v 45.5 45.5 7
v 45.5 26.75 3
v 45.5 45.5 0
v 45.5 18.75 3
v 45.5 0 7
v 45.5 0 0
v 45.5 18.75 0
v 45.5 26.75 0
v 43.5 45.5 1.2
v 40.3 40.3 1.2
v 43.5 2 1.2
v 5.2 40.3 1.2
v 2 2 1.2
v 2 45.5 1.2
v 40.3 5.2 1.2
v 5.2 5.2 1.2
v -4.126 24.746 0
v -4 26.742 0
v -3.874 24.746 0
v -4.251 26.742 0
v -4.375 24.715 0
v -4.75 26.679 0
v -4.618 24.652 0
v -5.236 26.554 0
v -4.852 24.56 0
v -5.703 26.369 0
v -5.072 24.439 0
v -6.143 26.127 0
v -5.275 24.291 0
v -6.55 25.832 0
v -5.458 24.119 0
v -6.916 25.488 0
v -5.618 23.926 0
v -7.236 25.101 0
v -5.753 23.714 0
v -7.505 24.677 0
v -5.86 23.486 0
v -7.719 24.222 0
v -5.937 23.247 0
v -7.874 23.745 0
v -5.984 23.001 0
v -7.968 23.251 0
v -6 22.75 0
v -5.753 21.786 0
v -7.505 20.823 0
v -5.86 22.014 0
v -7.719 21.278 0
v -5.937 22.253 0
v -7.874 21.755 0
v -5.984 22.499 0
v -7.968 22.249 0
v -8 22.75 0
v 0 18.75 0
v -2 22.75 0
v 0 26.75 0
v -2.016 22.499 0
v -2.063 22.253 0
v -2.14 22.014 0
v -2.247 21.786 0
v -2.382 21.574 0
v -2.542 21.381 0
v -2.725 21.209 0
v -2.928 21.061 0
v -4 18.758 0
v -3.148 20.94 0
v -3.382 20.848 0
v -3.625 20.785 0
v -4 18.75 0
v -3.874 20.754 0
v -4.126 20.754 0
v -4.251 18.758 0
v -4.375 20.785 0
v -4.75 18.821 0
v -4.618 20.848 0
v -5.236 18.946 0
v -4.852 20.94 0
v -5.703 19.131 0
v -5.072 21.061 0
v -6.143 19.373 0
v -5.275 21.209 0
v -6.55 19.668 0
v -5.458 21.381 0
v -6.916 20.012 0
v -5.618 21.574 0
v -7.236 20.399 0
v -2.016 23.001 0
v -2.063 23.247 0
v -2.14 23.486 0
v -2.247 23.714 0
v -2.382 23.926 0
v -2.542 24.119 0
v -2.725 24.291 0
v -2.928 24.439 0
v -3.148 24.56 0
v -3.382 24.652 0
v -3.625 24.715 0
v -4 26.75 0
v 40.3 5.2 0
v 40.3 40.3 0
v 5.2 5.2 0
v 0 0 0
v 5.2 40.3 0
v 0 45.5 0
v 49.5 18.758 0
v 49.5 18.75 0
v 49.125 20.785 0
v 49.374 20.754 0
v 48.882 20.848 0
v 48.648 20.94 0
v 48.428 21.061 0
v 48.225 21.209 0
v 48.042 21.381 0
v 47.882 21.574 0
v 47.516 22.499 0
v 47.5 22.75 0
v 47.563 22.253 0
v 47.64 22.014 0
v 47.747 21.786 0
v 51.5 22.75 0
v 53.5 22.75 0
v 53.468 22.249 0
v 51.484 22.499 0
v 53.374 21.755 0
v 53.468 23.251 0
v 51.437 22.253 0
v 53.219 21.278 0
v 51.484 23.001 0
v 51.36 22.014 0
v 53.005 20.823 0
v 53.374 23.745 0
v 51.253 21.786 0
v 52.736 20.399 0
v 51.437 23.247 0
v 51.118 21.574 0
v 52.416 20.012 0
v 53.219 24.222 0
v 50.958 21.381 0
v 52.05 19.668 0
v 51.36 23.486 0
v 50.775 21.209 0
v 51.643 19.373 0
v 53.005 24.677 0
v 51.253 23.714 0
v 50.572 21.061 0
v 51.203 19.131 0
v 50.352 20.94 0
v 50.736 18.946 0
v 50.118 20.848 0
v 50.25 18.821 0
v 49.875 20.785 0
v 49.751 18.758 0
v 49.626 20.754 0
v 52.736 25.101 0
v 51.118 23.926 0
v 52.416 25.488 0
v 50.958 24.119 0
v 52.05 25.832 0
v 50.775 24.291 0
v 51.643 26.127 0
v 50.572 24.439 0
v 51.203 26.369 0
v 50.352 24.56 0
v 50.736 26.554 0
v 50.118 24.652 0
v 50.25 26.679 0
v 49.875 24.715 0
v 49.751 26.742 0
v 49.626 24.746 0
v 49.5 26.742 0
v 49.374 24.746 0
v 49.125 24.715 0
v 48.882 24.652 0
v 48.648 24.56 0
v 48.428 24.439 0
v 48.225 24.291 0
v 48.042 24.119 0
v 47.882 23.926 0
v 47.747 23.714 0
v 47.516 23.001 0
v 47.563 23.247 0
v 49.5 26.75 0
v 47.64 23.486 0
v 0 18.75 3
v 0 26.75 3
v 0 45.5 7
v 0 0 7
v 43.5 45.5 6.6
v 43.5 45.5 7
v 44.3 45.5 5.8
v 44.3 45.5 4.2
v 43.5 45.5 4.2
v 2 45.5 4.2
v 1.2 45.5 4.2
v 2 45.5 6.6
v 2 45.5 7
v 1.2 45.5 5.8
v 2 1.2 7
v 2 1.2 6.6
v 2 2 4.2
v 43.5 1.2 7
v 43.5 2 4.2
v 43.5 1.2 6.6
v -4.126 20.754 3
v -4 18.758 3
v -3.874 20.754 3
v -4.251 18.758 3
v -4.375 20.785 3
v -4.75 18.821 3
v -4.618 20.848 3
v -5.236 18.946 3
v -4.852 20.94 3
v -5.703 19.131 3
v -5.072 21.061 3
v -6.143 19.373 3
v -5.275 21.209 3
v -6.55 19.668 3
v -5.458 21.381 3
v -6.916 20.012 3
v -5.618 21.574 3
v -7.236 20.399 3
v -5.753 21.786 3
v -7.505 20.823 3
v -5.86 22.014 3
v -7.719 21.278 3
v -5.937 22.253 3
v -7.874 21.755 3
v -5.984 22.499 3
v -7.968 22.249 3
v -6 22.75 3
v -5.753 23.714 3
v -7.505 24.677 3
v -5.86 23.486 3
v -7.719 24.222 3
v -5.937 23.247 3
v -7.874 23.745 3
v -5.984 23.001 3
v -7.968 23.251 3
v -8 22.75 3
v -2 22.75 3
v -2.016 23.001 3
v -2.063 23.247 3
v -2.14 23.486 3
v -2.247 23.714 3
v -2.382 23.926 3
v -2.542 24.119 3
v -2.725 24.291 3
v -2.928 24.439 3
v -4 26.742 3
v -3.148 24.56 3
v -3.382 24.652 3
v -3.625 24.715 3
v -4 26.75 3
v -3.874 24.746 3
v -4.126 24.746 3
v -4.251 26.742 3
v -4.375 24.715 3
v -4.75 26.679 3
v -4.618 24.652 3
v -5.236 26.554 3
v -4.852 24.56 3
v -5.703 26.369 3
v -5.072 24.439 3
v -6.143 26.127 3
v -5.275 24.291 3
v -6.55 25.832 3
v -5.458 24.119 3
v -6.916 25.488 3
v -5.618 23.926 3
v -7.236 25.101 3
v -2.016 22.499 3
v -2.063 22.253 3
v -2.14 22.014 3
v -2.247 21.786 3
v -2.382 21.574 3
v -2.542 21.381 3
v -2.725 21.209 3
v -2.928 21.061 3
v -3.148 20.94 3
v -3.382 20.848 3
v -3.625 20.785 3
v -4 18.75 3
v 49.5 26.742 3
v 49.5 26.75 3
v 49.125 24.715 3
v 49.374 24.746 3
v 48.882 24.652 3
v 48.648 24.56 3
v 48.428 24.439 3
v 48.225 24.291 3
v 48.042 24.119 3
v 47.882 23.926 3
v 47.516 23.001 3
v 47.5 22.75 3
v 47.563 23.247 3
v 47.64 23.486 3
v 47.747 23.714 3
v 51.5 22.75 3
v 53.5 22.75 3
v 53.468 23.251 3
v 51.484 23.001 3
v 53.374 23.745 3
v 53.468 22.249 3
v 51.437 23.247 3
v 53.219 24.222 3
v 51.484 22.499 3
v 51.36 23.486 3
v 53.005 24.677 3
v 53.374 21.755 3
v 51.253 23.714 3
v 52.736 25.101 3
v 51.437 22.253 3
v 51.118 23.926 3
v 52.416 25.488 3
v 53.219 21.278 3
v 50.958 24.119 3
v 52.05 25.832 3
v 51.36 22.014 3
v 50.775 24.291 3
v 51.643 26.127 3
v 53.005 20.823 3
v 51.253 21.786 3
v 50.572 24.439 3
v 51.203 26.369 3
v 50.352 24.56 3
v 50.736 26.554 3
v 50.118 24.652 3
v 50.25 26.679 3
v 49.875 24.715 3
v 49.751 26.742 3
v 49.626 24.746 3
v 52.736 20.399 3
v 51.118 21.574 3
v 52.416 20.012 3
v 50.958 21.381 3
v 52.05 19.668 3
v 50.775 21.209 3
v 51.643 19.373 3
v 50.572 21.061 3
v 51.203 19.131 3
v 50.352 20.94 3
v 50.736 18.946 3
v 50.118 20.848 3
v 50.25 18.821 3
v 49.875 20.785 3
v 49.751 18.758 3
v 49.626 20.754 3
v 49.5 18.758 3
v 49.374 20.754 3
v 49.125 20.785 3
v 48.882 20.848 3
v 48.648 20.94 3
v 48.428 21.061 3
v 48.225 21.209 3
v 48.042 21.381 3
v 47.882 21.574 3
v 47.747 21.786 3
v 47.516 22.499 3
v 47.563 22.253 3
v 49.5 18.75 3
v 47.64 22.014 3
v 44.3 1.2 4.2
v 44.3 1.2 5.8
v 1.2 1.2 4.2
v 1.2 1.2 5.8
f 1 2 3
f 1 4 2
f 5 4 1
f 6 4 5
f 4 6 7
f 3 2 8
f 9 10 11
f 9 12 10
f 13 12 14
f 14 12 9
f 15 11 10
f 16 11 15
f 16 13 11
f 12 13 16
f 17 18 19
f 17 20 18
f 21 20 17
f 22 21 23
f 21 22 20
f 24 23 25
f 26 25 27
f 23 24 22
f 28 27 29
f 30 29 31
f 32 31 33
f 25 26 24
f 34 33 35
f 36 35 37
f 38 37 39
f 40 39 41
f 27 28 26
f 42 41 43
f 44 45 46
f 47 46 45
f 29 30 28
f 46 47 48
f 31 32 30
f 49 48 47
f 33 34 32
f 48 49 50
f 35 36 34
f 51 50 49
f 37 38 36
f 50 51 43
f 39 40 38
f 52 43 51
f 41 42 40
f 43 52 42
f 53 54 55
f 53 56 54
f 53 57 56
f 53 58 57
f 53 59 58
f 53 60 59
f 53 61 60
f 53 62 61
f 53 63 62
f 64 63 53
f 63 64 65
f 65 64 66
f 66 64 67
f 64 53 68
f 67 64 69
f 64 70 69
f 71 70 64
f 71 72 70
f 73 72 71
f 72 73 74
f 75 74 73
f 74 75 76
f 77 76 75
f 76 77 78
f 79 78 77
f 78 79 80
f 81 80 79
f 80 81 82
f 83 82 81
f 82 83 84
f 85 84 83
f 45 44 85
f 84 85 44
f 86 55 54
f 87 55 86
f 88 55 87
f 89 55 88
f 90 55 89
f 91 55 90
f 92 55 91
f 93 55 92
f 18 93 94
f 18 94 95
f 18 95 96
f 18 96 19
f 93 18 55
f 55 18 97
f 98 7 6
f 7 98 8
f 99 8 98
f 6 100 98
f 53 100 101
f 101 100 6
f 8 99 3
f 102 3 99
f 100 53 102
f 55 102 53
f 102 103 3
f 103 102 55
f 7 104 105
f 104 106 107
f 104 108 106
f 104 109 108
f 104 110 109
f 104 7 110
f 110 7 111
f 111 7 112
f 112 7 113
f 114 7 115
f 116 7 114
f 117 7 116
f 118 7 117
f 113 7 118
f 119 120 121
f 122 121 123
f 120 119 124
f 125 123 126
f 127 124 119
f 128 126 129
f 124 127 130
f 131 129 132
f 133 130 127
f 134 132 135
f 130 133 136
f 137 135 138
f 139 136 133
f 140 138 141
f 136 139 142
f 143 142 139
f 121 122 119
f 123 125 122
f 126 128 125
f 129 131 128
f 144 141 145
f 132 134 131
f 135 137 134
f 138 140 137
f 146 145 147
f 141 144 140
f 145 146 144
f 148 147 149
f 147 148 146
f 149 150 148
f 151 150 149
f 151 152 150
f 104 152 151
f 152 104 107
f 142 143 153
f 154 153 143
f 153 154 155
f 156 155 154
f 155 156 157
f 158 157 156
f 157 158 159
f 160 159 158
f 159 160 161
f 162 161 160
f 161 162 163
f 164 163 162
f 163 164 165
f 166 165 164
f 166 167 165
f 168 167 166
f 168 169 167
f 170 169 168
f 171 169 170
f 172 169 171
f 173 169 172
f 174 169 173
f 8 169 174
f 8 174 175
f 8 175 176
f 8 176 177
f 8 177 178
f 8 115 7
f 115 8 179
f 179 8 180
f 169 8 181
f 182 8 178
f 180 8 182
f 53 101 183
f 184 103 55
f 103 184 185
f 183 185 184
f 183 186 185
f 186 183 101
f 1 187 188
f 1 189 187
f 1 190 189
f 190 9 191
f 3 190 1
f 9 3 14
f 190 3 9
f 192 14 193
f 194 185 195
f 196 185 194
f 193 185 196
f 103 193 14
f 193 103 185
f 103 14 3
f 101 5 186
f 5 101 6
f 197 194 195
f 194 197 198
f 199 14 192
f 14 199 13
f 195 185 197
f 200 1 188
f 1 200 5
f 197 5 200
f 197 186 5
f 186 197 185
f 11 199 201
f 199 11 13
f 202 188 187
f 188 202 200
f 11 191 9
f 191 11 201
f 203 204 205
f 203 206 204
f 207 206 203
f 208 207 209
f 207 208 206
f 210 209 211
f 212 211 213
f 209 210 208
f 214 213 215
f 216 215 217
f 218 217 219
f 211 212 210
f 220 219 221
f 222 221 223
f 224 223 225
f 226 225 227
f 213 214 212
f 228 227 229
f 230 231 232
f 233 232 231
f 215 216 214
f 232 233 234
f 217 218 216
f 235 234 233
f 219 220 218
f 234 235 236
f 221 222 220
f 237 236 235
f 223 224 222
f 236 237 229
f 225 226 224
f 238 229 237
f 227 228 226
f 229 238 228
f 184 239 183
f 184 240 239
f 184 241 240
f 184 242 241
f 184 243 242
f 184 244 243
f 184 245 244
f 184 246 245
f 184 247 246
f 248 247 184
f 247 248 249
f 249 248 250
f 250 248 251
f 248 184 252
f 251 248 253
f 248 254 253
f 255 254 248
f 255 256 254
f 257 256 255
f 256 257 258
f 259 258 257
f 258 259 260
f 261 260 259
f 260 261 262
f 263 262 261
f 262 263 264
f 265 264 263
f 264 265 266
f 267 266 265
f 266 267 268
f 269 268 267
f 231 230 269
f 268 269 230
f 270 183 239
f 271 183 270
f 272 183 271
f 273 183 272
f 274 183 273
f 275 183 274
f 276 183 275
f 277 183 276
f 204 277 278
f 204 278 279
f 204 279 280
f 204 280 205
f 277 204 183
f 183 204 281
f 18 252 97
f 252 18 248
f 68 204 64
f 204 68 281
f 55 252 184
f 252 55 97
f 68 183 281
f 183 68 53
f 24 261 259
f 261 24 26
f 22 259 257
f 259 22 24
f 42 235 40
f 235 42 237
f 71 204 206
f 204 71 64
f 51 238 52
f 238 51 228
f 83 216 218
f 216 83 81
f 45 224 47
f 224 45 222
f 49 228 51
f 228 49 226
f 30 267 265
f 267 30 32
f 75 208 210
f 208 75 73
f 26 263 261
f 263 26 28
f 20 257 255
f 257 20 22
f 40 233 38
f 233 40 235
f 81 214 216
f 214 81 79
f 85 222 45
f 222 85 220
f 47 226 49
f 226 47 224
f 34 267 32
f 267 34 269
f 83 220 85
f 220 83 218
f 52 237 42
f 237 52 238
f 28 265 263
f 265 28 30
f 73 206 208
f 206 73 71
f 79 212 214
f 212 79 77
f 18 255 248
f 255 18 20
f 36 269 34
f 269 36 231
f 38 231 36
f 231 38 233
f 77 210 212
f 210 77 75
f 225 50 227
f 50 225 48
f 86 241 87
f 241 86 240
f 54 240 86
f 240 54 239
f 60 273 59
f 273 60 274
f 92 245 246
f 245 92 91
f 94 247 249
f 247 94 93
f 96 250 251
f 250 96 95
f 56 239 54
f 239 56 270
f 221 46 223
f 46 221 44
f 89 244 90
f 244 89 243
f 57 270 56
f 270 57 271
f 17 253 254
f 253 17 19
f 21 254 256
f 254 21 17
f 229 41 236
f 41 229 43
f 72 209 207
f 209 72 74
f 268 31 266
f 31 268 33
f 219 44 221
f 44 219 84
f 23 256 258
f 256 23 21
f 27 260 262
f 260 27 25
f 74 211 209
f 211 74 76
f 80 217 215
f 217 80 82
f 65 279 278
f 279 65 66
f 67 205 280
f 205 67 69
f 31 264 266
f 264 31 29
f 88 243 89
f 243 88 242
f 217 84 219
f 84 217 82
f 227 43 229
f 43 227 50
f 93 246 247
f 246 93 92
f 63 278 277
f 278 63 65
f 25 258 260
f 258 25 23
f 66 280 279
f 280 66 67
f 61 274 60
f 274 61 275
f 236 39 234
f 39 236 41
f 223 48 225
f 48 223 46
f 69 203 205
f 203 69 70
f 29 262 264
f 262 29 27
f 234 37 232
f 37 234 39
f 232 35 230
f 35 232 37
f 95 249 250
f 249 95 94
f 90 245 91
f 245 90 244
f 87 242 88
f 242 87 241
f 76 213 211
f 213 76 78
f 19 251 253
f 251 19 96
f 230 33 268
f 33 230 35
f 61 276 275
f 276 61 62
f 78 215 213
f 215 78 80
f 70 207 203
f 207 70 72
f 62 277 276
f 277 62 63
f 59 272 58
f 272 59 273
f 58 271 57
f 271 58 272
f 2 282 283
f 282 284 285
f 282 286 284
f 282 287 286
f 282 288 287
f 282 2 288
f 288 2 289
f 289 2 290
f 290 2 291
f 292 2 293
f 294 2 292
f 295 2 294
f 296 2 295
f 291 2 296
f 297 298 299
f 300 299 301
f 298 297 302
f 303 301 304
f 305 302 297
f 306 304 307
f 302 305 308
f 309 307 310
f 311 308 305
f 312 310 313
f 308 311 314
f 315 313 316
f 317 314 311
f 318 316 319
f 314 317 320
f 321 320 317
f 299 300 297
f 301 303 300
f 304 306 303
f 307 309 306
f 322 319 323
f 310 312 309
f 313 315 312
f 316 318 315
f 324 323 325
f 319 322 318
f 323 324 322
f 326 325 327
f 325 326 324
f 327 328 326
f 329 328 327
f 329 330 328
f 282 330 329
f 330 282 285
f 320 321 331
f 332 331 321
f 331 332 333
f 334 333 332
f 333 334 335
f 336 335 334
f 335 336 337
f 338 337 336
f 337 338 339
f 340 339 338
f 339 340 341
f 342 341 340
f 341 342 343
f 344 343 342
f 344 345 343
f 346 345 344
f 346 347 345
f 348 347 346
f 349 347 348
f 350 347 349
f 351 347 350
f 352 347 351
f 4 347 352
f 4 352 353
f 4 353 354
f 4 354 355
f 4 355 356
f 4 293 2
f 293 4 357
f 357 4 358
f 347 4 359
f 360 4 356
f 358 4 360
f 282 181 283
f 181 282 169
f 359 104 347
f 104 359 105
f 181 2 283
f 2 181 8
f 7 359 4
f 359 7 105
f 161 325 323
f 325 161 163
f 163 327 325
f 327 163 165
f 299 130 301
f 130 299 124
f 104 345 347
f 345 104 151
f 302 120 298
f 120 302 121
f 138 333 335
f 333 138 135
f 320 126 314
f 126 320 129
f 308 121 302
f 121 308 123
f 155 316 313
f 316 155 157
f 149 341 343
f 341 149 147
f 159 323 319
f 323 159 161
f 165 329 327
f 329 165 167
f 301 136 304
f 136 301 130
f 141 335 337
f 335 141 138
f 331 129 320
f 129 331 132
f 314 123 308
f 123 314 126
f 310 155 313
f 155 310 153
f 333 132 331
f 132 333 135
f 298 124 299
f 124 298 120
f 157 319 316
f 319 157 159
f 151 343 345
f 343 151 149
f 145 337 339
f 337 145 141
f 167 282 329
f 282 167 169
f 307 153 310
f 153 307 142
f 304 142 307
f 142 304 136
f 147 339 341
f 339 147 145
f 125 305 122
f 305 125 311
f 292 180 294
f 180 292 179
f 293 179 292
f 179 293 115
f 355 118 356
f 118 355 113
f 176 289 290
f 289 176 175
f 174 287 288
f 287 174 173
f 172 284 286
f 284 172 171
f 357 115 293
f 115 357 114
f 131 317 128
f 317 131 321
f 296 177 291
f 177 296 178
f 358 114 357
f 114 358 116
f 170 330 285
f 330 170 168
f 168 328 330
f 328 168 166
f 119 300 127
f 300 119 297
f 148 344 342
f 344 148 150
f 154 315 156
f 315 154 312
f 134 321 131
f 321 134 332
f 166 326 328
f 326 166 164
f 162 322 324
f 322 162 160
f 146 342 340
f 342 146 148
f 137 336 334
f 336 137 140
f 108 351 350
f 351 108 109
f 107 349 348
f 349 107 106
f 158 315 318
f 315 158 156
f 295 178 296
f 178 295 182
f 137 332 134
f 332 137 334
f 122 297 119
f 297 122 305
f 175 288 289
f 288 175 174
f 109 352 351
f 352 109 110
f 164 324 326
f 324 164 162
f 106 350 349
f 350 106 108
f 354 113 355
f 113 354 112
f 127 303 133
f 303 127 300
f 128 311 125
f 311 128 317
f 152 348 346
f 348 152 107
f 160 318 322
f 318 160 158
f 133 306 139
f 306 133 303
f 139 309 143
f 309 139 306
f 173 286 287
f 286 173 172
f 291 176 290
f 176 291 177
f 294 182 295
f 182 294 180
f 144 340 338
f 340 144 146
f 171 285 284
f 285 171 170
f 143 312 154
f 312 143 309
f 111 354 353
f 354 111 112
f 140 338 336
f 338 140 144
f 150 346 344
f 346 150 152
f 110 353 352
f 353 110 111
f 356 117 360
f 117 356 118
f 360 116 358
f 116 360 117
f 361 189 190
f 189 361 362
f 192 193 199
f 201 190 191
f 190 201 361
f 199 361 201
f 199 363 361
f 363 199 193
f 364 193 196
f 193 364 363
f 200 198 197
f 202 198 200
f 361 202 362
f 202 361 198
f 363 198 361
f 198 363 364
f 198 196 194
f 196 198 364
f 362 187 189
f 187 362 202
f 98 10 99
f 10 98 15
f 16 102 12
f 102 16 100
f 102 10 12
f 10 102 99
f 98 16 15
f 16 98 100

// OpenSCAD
// file: ../lib/pcb_led_cvf.scad
// for led power module modified

/* bluetooth_mate_holder.scad
 * By John Biehler - November 17, 2011
 * http://www.thingiverse.com/thing:

 * derived from pcb_box_slide_with_tabs.scad
 * By Nicholas C Lewis - Jan 1, 2011
 * http://www.thingiverse.com/thing:5396
 *
 * derived from pcb_box_slide.scad
 *     Parametric, open PCB-box (slide-in) by chlunde
 *     http://www.thingiverse.com/thing:4071
 *
 * CHANGES
 * - adjusted to fit Arduino Mega
 * - added mounting tabs
 * - turned off cutouts
 * - adjusted bottom cutout size
 */

$fn=50;

module pcb_led_cvf(

	pcb_width = 48.2,
	pcb_length =24.1,
	pcb_height =1.1,
	slisse = 0.8,

	pcb_bottom_margin = 1,
	wall_width_thick = 2,
	box_height = 7,

	//tab parameters
	tab_hole_radius=2,
	tab_outer_radius=4,

	inner_margin = 4,

	add_tabs = true

) {
	wall_width = wall_width_thick-slisse;

module tab() {
	difference(){
		union() {
			translate([-tab_outer_radius,-tab_outer_radius,0])
			cube([tab_outer_radius,2*tab_outer_radius,wall_width_thick+1]);
			translate([-tab_outer_radius,0,0])
				cylinder(r=tab_outer_radius, h = wall_width_thick+1);
		}
		translate([-tab_outer_radius,0,0]) {
			cylinder(r= tab_hole_radius, h = wall_width_thick+5,center=true);
		}
	}

}

module box() {
	union() {
		cube([pcb_width + 2*wall_width, pcb_length + 2*wall_width, wall_width]);

		cube([wall_width_thick, pcb_length + 2*wall_width, box_height]);

		cube([pcb_width + 2*wall_width, wall_width_thick, box_height]);

		%translate([0, pcb_length+wall_width, 0])
			cube([pcb_width + 2*wall_width,wall_width,box_height]);

		translate([pcb_width + wall_width - slisse,0,0])
			cube([wall_width_thick, pcb_length + 2*wall_width, box_height]);
	}
	if(add_tabs) {
//comment out this part to remove tabs
		for(i=[(pcb_length + 2*wall_width)/2]){
	translate([0,i,0])tab();
	translate([pcb_width + 2*wall_width,i,0])mirror()tab();
		}
	}

}

module pcb() {
	translate([wall_width, wall_width, wall_width + pcb_bottom_margin])
		cube([pcb_width,pcb_length + wall_width + 0.1,pcb_height]);
	translate([wall_width, wall_width, wall_width + pcb_bottom_margin+pcb_height])rotate([0,45,0])
		cube([pcb_height,pcb_length + wall_width + 0.1,pcb_height]);
	translate([wall_width+pcb_width-2*cos(45)*pcb_height, wall_width, wall_width + pcb_bottom_margin+pcb_height])rotate([0,45,0])
		cube([pcb_height,pcb_length + wall_width + 0.1,pcb_height]);
	translate([wall_width_thick, wall_width, wall_width + pcb_bottom_margin])
		cube([pcb_width-2*slisse,pcb_length + wall_width + 0.1,box_height]);

}



module holes() {
		*translate([wall_width + pcb_width/2, wall_width_thick + 0.1, pcb_width/2+wall_width])
			rotate(a=90,v=[1,0,0])
				cylinder(r=pcb_width/2, h=wall_width_thick + 0.2);

		*translate([-0.1, wall_width + pcb_length/2, pcb_length/2 + wall_width])
			rotate(a=90,v=[0,1,0])
				cylinder(r=pcb_length/2, h=wall_width_thick + 0.2);

		*translate([pcb_width + wall_width - slisse - 0.1, wall_width + pcb_length/2, pcb_length/2 + wall_width])
			rotate(a=90,v=[0,1,0])
				cylinder(r=pcb_length/2, h=wall_width_thick + 0.2);

	 * translate([pcb_width/2 + wall_width, wall_width + pcb_length/2, -0.1])
			rotate(a=0,v=[0,1,0])
				cylinder(r=min(pcb_length,pcb_width)/2 - wall_width/2, h=wall_width_thick + 0.2);

		translate([inner_margin +wall_width, inner_margin+wall_width, -0.1])
			cube([pcb_width-inner_margin*2,pcb_length -inner_margin*2,wall_width + 0.2]);
}

	difference() {
		box();
		pcb();
		holes();
	}
}



pcb_led_cvf();
// main file
use <../lib/pcb_led_cvf.scad>


pcb_led_cvf(
  pcb_length=43.1,
  pcb_width=43.1,
  pcb_height=1.6,
  pcb_bottom_margin=3
);
